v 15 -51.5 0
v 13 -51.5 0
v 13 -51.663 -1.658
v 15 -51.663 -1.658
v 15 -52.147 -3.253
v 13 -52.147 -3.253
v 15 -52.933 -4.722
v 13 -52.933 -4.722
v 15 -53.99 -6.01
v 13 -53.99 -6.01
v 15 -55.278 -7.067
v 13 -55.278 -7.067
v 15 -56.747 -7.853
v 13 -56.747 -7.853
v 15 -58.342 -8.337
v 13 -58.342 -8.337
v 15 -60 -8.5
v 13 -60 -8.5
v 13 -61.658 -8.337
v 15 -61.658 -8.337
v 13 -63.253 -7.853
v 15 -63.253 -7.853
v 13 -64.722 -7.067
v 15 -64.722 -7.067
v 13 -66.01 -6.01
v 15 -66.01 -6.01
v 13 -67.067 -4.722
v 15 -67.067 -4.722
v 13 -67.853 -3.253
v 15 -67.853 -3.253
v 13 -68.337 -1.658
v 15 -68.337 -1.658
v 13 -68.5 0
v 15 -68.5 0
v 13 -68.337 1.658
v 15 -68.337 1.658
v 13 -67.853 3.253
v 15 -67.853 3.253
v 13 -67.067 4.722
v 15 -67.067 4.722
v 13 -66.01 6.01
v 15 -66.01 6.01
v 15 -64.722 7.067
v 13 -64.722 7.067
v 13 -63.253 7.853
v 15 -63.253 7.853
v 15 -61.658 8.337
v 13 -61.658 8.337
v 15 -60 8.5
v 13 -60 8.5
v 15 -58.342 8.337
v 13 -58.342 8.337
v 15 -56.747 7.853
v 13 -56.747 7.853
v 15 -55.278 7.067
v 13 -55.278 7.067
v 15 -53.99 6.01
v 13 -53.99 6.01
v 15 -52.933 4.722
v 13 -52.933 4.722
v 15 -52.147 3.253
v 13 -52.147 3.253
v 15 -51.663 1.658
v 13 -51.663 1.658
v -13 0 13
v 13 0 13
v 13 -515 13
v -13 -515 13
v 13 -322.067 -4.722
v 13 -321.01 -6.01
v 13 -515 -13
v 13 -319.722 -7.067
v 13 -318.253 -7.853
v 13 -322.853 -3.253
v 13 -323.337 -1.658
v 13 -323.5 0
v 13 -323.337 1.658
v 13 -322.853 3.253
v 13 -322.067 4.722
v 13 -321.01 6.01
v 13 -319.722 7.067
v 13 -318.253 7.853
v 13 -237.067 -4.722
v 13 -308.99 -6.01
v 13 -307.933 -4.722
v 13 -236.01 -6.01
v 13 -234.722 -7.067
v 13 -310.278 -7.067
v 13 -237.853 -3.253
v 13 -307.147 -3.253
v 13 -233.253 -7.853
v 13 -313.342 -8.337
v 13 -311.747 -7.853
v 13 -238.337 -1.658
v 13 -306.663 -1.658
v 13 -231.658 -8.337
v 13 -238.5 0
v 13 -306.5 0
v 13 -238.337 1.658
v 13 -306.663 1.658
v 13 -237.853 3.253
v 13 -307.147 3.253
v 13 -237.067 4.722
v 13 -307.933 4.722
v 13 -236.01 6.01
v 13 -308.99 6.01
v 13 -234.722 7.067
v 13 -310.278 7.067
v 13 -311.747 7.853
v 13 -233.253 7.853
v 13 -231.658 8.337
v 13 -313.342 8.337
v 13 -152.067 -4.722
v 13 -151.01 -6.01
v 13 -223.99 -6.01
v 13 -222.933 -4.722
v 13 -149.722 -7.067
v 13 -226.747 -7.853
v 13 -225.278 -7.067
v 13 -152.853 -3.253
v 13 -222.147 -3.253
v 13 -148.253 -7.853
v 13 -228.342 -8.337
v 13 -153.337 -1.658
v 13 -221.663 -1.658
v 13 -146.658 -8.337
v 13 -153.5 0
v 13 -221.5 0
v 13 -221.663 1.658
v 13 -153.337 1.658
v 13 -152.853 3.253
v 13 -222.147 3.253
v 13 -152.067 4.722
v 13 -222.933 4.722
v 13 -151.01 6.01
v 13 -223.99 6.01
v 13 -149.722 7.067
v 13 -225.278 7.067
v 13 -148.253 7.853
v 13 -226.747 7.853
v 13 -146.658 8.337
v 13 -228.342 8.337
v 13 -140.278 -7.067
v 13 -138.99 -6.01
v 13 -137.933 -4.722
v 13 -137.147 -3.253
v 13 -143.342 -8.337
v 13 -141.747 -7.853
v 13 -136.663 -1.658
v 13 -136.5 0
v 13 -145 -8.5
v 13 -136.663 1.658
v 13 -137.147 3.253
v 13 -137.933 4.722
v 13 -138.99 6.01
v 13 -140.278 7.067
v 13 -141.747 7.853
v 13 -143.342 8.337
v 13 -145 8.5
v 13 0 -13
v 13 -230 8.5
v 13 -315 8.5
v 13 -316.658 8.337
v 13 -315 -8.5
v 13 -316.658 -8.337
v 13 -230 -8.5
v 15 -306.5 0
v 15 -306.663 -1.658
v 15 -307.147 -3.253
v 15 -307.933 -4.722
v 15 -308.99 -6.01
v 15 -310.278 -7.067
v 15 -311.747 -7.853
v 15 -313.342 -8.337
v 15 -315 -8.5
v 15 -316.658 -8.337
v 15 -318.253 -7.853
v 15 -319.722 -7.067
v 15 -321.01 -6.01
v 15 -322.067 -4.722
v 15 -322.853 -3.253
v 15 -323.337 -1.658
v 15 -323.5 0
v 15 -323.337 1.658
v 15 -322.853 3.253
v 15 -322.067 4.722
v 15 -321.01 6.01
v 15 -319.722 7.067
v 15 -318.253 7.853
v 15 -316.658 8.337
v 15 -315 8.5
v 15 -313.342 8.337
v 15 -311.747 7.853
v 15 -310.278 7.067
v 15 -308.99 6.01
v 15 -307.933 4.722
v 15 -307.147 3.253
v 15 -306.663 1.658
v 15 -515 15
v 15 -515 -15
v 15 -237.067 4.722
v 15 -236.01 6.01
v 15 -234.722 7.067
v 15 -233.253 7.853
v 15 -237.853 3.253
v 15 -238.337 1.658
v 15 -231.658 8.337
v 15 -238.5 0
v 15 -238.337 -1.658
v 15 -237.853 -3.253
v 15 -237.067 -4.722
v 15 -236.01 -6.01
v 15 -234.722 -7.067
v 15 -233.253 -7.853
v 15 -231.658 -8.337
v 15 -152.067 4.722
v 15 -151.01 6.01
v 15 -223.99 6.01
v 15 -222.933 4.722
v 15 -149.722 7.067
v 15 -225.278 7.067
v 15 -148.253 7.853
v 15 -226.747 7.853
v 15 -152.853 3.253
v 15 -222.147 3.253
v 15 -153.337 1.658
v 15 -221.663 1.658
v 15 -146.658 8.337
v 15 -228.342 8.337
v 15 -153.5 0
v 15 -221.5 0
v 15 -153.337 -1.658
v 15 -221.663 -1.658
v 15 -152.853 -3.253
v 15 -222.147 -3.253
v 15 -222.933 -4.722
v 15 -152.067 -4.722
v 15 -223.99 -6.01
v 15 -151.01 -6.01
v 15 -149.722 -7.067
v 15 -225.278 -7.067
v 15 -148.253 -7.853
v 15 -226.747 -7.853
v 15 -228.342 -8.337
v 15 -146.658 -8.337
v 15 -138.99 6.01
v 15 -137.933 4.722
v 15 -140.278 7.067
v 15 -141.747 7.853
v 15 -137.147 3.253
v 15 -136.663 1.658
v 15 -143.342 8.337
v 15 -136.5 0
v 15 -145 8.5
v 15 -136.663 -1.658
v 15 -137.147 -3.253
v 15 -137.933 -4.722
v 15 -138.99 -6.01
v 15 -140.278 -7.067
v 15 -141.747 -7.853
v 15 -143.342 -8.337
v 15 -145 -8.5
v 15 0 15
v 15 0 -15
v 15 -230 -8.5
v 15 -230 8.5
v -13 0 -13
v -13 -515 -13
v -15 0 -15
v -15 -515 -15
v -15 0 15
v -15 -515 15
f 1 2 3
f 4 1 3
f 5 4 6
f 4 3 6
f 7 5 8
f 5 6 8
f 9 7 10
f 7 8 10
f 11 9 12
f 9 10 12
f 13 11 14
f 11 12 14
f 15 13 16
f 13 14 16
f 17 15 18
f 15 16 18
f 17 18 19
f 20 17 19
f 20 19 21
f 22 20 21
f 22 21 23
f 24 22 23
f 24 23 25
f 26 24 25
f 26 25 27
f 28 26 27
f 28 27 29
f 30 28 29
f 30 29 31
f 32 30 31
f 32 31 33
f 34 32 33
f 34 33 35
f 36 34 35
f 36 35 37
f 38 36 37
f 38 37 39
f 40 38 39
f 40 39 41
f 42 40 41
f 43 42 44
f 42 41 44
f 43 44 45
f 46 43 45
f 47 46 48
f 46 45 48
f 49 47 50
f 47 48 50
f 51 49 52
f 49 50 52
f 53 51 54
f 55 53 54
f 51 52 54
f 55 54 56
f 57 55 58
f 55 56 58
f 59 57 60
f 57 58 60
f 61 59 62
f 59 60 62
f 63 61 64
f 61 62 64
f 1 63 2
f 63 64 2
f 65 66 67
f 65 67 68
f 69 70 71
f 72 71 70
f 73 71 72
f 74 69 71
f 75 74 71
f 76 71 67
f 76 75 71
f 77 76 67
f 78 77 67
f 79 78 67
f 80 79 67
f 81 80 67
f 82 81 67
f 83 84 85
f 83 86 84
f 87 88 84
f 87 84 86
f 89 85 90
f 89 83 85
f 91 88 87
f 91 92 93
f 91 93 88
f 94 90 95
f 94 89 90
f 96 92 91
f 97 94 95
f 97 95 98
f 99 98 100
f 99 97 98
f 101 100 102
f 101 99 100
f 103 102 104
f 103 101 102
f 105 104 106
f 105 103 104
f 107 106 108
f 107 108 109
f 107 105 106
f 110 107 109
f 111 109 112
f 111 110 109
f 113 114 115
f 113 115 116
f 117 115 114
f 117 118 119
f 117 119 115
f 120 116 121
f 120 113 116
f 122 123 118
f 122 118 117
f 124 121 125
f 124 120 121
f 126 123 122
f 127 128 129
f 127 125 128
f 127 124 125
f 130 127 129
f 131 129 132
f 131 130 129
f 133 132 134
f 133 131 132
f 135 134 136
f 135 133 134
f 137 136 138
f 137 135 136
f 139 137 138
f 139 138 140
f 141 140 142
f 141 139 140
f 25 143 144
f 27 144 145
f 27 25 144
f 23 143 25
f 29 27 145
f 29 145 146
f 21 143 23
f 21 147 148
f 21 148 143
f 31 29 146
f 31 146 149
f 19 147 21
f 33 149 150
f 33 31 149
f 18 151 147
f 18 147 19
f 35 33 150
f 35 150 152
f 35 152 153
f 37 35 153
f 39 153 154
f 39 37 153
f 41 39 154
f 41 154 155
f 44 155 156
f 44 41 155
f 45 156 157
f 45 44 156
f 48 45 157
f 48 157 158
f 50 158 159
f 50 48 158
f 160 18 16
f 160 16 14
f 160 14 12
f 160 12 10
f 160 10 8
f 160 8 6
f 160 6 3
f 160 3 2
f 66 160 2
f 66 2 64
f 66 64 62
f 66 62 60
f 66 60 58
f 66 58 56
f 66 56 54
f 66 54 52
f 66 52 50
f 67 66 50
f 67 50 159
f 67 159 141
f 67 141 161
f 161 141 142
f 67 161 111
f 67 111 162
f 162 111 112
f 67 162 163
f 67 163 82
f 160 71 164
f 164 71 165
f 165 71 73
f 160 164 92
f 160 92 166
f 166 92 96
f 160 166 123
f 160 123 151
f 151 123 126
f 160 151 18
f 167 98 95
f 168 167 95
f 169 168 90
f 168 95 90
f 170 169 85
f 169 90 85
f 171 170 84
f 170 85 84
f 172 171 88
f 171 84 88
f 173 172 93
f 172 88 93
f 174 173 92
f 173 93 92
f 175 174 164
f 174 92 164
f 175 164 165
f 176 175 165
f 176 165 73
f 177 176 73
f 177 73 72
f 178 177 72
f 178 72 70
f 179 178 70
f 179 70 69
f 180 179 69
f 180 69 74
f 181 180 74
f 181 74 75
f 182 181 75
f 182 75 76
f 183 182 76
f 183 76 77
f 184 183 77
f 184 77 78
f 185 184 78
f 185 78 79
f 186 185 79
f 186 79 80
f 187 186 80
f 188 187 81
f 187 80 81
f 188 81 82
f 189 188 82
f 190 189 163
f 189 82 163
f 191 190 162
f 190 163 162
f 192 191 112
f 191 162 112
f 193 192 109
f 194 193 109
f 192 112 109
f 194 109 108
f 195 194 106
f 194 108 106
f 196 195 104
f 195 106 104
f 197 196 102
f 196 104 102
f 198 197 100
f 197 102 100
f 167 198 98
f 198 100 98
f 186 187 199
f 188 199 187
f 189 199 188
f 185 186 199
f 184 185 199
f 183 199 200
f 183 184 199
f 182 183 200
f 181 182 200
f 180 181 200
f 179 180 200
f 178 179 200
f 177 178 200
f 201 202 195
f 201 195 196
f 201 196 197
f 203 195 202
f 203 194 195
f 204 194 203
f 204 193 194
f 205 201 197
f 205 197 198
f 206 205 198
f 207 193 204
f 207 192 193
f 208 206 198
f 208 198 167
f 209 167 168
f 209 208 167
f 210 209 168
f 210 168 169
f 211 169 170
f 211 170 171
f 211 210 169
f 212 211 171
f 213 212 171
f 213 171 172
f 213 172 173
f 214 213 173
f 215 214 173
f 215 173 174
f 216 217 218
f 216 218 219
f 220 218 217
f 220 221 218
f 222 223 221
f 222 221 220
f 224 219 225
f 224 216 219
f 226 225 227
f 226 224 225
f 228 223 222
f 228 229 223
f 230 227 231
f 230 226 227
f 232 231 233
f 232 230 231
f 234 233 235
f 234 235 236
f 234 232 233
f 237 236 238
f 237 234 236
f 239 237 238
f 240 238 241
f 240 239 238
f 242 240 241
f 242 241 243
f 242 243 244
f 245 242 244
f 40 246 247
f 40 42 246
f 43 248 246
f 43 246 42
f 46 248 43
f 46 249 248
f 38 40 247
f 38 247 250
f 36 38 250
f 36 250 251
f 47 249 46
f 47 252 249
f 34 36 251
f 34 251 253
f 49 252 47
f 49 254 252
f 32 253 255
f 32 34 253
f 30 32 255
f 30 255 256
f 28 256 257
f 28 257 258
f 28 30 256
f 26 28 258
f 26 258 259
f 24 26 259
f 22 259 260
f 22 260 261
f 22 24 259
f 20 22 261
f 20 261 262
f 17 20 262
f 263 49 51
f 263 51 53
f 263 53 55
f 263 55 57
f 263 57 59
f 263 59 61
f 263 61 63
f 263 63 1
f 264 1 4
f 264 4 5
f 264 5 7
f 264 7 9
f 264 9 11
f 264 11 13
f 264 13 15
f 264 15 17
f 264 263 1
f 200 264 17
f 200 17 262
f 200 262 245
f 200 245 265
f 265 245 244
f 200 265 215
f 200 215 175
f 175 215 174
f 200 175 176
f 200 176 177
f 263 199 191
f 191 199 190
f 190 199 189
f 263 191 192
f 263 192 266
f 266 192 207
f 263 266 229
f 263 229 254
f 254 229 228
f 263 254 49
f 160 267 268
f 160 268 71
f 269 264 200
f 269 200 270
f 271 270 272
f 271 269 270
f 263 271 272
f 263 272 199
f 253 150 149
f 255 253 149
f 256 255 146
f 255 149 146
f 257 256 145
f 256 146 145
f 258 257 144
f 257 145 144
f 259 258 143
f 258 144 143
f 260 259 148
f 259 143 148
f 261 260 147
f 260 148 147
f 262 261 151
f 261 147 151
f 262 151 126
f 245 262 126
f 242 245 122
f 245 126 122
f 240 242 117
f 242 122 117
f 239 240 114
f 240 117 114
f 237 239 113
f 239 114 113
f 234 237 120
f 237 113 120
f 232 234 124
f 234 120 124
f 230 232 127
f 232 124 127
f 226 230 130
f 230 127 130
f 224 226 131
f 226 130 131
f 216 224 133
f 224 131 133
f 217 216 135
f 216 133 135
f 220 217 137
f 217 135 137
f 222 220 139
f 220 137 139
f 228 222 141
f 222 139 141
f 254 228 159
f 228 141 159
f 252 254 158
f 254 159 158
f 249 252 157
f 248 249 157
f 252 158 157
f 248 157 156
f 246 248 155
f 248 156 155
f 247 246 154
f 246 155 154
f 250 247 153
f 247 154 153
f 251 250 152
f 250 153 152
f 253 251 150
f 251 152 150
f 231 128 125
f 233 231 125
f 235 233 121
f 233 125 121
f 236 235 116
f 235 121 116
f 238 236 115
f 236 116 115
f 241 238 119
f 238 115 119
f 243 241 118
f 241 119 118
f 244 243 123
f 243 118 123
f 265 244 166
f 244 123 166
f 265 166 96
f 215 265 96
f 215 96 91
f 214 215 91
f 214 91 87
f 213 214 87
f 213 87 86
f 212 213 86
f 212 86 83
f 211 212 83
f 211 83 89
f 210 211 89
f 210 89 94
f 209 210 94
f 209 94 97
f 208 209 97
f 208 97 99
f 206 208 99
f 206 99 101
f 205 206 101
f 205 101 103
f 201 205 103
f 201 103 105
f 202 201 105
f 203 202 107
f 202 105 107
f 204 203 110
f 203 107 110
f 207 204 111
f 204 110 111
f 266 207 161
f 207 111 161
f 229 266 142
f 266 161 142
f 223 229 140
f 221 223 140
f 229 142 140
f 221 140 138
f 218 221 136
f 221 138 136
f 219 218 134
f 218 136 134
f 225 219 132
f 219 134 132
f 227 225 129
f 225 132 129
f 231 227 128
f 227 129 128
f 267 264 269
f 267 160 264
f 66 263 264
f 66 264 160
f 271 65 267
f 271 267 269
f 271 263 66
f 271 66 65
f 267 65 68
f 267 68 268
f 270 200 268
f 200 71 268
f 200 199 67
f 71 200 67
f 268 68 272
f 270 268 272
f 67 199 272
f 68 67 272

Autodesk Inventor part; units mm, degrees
ref_plane "YZ Plane" through (0, 0, 0) normal (1, 0, 0) x (0, 1, 0)
ref_plane "XZ Plane" through (0, 0, 0) normal (0, 1, 0) x (-1, 0, 0)
ref_plane "XY Plane" through (0, 0, 0) normal (0, 0, 1) x (1, 0, 0)
sketch "Sketch9" plane through (0, 0, 0) normal (0, 1, 0) x (-1, 0, 0)
  line L0 (15, 15) -> (-15, 15)
  line L1 (-15, 15) -> (-15, -15)
  line L2 (-15, -15) -> (15, -15)
  line L3 (15, -15) -> (15, 15)
  line L4 (15, 15) -> (-15, -15) construction
  line L5 (-15, 15) -> (15, -15) construction
  line L6 (-13, 13) -> (13, 13)
  line L7 (13, 13) -> (13, -13)
  line L8 (13, -13) -> (-13, -13)
  line L9 (-13, -13) -> (-13, 13)
  point P0 (0, 0)
  dimension "d172" = 30
  dimension "d173" = 30
  dimension "d174" = 2
extrude "Extrusion3" add sketch "Sketch9" against normal blind 515
sketch "Sketch10" plane through (0, 0, 0) normal (1, 0, 0) x (0, 1, 0)
  line L0 (0, 15) -> (0, -15) construction
  line L1 (0, 15) -> (-515, 15) construction
  line L2 (-515, -15) -> (-515, 15) construction
  line L3 (0, -15) -> (-515, -15) construction
  line L4 (-68.5, 8.5) -> (-51.5, 8.5)
  line L5 (-51.5, 8.5) -> (-51.5, -8.5)
  line L6 (-51.5, -8.5) -> (-68.5, -8.5)
  line L7 (-68.5, -8.5) -> (-68.5, 8.5)
  line L8 (-68.5, 8.5) -> (-51.5, -8.5) construction
  line L9 (-51.5, 8.5) -> (-68.5, -8.5) construction
  line L10 (0, 0) -> (30, 0)
  circle A0 centre (-60, 0) radius 8.5
  dimension "d177" = 17
  dimension "d178" = 17
  dimension "d181" = 30
  dimension "d182" = 90
extrude "Extrusion4" cut sketch "Sketch10" along normal through all contours A0
pattern_linear "Rectangular Pattern4" count 4 spacing 85 along (0, -1, 0) of "Extrusion4"
properties part number "PRS 1661 DrSysB way tube 1_1200" material "Stainless Steel"
